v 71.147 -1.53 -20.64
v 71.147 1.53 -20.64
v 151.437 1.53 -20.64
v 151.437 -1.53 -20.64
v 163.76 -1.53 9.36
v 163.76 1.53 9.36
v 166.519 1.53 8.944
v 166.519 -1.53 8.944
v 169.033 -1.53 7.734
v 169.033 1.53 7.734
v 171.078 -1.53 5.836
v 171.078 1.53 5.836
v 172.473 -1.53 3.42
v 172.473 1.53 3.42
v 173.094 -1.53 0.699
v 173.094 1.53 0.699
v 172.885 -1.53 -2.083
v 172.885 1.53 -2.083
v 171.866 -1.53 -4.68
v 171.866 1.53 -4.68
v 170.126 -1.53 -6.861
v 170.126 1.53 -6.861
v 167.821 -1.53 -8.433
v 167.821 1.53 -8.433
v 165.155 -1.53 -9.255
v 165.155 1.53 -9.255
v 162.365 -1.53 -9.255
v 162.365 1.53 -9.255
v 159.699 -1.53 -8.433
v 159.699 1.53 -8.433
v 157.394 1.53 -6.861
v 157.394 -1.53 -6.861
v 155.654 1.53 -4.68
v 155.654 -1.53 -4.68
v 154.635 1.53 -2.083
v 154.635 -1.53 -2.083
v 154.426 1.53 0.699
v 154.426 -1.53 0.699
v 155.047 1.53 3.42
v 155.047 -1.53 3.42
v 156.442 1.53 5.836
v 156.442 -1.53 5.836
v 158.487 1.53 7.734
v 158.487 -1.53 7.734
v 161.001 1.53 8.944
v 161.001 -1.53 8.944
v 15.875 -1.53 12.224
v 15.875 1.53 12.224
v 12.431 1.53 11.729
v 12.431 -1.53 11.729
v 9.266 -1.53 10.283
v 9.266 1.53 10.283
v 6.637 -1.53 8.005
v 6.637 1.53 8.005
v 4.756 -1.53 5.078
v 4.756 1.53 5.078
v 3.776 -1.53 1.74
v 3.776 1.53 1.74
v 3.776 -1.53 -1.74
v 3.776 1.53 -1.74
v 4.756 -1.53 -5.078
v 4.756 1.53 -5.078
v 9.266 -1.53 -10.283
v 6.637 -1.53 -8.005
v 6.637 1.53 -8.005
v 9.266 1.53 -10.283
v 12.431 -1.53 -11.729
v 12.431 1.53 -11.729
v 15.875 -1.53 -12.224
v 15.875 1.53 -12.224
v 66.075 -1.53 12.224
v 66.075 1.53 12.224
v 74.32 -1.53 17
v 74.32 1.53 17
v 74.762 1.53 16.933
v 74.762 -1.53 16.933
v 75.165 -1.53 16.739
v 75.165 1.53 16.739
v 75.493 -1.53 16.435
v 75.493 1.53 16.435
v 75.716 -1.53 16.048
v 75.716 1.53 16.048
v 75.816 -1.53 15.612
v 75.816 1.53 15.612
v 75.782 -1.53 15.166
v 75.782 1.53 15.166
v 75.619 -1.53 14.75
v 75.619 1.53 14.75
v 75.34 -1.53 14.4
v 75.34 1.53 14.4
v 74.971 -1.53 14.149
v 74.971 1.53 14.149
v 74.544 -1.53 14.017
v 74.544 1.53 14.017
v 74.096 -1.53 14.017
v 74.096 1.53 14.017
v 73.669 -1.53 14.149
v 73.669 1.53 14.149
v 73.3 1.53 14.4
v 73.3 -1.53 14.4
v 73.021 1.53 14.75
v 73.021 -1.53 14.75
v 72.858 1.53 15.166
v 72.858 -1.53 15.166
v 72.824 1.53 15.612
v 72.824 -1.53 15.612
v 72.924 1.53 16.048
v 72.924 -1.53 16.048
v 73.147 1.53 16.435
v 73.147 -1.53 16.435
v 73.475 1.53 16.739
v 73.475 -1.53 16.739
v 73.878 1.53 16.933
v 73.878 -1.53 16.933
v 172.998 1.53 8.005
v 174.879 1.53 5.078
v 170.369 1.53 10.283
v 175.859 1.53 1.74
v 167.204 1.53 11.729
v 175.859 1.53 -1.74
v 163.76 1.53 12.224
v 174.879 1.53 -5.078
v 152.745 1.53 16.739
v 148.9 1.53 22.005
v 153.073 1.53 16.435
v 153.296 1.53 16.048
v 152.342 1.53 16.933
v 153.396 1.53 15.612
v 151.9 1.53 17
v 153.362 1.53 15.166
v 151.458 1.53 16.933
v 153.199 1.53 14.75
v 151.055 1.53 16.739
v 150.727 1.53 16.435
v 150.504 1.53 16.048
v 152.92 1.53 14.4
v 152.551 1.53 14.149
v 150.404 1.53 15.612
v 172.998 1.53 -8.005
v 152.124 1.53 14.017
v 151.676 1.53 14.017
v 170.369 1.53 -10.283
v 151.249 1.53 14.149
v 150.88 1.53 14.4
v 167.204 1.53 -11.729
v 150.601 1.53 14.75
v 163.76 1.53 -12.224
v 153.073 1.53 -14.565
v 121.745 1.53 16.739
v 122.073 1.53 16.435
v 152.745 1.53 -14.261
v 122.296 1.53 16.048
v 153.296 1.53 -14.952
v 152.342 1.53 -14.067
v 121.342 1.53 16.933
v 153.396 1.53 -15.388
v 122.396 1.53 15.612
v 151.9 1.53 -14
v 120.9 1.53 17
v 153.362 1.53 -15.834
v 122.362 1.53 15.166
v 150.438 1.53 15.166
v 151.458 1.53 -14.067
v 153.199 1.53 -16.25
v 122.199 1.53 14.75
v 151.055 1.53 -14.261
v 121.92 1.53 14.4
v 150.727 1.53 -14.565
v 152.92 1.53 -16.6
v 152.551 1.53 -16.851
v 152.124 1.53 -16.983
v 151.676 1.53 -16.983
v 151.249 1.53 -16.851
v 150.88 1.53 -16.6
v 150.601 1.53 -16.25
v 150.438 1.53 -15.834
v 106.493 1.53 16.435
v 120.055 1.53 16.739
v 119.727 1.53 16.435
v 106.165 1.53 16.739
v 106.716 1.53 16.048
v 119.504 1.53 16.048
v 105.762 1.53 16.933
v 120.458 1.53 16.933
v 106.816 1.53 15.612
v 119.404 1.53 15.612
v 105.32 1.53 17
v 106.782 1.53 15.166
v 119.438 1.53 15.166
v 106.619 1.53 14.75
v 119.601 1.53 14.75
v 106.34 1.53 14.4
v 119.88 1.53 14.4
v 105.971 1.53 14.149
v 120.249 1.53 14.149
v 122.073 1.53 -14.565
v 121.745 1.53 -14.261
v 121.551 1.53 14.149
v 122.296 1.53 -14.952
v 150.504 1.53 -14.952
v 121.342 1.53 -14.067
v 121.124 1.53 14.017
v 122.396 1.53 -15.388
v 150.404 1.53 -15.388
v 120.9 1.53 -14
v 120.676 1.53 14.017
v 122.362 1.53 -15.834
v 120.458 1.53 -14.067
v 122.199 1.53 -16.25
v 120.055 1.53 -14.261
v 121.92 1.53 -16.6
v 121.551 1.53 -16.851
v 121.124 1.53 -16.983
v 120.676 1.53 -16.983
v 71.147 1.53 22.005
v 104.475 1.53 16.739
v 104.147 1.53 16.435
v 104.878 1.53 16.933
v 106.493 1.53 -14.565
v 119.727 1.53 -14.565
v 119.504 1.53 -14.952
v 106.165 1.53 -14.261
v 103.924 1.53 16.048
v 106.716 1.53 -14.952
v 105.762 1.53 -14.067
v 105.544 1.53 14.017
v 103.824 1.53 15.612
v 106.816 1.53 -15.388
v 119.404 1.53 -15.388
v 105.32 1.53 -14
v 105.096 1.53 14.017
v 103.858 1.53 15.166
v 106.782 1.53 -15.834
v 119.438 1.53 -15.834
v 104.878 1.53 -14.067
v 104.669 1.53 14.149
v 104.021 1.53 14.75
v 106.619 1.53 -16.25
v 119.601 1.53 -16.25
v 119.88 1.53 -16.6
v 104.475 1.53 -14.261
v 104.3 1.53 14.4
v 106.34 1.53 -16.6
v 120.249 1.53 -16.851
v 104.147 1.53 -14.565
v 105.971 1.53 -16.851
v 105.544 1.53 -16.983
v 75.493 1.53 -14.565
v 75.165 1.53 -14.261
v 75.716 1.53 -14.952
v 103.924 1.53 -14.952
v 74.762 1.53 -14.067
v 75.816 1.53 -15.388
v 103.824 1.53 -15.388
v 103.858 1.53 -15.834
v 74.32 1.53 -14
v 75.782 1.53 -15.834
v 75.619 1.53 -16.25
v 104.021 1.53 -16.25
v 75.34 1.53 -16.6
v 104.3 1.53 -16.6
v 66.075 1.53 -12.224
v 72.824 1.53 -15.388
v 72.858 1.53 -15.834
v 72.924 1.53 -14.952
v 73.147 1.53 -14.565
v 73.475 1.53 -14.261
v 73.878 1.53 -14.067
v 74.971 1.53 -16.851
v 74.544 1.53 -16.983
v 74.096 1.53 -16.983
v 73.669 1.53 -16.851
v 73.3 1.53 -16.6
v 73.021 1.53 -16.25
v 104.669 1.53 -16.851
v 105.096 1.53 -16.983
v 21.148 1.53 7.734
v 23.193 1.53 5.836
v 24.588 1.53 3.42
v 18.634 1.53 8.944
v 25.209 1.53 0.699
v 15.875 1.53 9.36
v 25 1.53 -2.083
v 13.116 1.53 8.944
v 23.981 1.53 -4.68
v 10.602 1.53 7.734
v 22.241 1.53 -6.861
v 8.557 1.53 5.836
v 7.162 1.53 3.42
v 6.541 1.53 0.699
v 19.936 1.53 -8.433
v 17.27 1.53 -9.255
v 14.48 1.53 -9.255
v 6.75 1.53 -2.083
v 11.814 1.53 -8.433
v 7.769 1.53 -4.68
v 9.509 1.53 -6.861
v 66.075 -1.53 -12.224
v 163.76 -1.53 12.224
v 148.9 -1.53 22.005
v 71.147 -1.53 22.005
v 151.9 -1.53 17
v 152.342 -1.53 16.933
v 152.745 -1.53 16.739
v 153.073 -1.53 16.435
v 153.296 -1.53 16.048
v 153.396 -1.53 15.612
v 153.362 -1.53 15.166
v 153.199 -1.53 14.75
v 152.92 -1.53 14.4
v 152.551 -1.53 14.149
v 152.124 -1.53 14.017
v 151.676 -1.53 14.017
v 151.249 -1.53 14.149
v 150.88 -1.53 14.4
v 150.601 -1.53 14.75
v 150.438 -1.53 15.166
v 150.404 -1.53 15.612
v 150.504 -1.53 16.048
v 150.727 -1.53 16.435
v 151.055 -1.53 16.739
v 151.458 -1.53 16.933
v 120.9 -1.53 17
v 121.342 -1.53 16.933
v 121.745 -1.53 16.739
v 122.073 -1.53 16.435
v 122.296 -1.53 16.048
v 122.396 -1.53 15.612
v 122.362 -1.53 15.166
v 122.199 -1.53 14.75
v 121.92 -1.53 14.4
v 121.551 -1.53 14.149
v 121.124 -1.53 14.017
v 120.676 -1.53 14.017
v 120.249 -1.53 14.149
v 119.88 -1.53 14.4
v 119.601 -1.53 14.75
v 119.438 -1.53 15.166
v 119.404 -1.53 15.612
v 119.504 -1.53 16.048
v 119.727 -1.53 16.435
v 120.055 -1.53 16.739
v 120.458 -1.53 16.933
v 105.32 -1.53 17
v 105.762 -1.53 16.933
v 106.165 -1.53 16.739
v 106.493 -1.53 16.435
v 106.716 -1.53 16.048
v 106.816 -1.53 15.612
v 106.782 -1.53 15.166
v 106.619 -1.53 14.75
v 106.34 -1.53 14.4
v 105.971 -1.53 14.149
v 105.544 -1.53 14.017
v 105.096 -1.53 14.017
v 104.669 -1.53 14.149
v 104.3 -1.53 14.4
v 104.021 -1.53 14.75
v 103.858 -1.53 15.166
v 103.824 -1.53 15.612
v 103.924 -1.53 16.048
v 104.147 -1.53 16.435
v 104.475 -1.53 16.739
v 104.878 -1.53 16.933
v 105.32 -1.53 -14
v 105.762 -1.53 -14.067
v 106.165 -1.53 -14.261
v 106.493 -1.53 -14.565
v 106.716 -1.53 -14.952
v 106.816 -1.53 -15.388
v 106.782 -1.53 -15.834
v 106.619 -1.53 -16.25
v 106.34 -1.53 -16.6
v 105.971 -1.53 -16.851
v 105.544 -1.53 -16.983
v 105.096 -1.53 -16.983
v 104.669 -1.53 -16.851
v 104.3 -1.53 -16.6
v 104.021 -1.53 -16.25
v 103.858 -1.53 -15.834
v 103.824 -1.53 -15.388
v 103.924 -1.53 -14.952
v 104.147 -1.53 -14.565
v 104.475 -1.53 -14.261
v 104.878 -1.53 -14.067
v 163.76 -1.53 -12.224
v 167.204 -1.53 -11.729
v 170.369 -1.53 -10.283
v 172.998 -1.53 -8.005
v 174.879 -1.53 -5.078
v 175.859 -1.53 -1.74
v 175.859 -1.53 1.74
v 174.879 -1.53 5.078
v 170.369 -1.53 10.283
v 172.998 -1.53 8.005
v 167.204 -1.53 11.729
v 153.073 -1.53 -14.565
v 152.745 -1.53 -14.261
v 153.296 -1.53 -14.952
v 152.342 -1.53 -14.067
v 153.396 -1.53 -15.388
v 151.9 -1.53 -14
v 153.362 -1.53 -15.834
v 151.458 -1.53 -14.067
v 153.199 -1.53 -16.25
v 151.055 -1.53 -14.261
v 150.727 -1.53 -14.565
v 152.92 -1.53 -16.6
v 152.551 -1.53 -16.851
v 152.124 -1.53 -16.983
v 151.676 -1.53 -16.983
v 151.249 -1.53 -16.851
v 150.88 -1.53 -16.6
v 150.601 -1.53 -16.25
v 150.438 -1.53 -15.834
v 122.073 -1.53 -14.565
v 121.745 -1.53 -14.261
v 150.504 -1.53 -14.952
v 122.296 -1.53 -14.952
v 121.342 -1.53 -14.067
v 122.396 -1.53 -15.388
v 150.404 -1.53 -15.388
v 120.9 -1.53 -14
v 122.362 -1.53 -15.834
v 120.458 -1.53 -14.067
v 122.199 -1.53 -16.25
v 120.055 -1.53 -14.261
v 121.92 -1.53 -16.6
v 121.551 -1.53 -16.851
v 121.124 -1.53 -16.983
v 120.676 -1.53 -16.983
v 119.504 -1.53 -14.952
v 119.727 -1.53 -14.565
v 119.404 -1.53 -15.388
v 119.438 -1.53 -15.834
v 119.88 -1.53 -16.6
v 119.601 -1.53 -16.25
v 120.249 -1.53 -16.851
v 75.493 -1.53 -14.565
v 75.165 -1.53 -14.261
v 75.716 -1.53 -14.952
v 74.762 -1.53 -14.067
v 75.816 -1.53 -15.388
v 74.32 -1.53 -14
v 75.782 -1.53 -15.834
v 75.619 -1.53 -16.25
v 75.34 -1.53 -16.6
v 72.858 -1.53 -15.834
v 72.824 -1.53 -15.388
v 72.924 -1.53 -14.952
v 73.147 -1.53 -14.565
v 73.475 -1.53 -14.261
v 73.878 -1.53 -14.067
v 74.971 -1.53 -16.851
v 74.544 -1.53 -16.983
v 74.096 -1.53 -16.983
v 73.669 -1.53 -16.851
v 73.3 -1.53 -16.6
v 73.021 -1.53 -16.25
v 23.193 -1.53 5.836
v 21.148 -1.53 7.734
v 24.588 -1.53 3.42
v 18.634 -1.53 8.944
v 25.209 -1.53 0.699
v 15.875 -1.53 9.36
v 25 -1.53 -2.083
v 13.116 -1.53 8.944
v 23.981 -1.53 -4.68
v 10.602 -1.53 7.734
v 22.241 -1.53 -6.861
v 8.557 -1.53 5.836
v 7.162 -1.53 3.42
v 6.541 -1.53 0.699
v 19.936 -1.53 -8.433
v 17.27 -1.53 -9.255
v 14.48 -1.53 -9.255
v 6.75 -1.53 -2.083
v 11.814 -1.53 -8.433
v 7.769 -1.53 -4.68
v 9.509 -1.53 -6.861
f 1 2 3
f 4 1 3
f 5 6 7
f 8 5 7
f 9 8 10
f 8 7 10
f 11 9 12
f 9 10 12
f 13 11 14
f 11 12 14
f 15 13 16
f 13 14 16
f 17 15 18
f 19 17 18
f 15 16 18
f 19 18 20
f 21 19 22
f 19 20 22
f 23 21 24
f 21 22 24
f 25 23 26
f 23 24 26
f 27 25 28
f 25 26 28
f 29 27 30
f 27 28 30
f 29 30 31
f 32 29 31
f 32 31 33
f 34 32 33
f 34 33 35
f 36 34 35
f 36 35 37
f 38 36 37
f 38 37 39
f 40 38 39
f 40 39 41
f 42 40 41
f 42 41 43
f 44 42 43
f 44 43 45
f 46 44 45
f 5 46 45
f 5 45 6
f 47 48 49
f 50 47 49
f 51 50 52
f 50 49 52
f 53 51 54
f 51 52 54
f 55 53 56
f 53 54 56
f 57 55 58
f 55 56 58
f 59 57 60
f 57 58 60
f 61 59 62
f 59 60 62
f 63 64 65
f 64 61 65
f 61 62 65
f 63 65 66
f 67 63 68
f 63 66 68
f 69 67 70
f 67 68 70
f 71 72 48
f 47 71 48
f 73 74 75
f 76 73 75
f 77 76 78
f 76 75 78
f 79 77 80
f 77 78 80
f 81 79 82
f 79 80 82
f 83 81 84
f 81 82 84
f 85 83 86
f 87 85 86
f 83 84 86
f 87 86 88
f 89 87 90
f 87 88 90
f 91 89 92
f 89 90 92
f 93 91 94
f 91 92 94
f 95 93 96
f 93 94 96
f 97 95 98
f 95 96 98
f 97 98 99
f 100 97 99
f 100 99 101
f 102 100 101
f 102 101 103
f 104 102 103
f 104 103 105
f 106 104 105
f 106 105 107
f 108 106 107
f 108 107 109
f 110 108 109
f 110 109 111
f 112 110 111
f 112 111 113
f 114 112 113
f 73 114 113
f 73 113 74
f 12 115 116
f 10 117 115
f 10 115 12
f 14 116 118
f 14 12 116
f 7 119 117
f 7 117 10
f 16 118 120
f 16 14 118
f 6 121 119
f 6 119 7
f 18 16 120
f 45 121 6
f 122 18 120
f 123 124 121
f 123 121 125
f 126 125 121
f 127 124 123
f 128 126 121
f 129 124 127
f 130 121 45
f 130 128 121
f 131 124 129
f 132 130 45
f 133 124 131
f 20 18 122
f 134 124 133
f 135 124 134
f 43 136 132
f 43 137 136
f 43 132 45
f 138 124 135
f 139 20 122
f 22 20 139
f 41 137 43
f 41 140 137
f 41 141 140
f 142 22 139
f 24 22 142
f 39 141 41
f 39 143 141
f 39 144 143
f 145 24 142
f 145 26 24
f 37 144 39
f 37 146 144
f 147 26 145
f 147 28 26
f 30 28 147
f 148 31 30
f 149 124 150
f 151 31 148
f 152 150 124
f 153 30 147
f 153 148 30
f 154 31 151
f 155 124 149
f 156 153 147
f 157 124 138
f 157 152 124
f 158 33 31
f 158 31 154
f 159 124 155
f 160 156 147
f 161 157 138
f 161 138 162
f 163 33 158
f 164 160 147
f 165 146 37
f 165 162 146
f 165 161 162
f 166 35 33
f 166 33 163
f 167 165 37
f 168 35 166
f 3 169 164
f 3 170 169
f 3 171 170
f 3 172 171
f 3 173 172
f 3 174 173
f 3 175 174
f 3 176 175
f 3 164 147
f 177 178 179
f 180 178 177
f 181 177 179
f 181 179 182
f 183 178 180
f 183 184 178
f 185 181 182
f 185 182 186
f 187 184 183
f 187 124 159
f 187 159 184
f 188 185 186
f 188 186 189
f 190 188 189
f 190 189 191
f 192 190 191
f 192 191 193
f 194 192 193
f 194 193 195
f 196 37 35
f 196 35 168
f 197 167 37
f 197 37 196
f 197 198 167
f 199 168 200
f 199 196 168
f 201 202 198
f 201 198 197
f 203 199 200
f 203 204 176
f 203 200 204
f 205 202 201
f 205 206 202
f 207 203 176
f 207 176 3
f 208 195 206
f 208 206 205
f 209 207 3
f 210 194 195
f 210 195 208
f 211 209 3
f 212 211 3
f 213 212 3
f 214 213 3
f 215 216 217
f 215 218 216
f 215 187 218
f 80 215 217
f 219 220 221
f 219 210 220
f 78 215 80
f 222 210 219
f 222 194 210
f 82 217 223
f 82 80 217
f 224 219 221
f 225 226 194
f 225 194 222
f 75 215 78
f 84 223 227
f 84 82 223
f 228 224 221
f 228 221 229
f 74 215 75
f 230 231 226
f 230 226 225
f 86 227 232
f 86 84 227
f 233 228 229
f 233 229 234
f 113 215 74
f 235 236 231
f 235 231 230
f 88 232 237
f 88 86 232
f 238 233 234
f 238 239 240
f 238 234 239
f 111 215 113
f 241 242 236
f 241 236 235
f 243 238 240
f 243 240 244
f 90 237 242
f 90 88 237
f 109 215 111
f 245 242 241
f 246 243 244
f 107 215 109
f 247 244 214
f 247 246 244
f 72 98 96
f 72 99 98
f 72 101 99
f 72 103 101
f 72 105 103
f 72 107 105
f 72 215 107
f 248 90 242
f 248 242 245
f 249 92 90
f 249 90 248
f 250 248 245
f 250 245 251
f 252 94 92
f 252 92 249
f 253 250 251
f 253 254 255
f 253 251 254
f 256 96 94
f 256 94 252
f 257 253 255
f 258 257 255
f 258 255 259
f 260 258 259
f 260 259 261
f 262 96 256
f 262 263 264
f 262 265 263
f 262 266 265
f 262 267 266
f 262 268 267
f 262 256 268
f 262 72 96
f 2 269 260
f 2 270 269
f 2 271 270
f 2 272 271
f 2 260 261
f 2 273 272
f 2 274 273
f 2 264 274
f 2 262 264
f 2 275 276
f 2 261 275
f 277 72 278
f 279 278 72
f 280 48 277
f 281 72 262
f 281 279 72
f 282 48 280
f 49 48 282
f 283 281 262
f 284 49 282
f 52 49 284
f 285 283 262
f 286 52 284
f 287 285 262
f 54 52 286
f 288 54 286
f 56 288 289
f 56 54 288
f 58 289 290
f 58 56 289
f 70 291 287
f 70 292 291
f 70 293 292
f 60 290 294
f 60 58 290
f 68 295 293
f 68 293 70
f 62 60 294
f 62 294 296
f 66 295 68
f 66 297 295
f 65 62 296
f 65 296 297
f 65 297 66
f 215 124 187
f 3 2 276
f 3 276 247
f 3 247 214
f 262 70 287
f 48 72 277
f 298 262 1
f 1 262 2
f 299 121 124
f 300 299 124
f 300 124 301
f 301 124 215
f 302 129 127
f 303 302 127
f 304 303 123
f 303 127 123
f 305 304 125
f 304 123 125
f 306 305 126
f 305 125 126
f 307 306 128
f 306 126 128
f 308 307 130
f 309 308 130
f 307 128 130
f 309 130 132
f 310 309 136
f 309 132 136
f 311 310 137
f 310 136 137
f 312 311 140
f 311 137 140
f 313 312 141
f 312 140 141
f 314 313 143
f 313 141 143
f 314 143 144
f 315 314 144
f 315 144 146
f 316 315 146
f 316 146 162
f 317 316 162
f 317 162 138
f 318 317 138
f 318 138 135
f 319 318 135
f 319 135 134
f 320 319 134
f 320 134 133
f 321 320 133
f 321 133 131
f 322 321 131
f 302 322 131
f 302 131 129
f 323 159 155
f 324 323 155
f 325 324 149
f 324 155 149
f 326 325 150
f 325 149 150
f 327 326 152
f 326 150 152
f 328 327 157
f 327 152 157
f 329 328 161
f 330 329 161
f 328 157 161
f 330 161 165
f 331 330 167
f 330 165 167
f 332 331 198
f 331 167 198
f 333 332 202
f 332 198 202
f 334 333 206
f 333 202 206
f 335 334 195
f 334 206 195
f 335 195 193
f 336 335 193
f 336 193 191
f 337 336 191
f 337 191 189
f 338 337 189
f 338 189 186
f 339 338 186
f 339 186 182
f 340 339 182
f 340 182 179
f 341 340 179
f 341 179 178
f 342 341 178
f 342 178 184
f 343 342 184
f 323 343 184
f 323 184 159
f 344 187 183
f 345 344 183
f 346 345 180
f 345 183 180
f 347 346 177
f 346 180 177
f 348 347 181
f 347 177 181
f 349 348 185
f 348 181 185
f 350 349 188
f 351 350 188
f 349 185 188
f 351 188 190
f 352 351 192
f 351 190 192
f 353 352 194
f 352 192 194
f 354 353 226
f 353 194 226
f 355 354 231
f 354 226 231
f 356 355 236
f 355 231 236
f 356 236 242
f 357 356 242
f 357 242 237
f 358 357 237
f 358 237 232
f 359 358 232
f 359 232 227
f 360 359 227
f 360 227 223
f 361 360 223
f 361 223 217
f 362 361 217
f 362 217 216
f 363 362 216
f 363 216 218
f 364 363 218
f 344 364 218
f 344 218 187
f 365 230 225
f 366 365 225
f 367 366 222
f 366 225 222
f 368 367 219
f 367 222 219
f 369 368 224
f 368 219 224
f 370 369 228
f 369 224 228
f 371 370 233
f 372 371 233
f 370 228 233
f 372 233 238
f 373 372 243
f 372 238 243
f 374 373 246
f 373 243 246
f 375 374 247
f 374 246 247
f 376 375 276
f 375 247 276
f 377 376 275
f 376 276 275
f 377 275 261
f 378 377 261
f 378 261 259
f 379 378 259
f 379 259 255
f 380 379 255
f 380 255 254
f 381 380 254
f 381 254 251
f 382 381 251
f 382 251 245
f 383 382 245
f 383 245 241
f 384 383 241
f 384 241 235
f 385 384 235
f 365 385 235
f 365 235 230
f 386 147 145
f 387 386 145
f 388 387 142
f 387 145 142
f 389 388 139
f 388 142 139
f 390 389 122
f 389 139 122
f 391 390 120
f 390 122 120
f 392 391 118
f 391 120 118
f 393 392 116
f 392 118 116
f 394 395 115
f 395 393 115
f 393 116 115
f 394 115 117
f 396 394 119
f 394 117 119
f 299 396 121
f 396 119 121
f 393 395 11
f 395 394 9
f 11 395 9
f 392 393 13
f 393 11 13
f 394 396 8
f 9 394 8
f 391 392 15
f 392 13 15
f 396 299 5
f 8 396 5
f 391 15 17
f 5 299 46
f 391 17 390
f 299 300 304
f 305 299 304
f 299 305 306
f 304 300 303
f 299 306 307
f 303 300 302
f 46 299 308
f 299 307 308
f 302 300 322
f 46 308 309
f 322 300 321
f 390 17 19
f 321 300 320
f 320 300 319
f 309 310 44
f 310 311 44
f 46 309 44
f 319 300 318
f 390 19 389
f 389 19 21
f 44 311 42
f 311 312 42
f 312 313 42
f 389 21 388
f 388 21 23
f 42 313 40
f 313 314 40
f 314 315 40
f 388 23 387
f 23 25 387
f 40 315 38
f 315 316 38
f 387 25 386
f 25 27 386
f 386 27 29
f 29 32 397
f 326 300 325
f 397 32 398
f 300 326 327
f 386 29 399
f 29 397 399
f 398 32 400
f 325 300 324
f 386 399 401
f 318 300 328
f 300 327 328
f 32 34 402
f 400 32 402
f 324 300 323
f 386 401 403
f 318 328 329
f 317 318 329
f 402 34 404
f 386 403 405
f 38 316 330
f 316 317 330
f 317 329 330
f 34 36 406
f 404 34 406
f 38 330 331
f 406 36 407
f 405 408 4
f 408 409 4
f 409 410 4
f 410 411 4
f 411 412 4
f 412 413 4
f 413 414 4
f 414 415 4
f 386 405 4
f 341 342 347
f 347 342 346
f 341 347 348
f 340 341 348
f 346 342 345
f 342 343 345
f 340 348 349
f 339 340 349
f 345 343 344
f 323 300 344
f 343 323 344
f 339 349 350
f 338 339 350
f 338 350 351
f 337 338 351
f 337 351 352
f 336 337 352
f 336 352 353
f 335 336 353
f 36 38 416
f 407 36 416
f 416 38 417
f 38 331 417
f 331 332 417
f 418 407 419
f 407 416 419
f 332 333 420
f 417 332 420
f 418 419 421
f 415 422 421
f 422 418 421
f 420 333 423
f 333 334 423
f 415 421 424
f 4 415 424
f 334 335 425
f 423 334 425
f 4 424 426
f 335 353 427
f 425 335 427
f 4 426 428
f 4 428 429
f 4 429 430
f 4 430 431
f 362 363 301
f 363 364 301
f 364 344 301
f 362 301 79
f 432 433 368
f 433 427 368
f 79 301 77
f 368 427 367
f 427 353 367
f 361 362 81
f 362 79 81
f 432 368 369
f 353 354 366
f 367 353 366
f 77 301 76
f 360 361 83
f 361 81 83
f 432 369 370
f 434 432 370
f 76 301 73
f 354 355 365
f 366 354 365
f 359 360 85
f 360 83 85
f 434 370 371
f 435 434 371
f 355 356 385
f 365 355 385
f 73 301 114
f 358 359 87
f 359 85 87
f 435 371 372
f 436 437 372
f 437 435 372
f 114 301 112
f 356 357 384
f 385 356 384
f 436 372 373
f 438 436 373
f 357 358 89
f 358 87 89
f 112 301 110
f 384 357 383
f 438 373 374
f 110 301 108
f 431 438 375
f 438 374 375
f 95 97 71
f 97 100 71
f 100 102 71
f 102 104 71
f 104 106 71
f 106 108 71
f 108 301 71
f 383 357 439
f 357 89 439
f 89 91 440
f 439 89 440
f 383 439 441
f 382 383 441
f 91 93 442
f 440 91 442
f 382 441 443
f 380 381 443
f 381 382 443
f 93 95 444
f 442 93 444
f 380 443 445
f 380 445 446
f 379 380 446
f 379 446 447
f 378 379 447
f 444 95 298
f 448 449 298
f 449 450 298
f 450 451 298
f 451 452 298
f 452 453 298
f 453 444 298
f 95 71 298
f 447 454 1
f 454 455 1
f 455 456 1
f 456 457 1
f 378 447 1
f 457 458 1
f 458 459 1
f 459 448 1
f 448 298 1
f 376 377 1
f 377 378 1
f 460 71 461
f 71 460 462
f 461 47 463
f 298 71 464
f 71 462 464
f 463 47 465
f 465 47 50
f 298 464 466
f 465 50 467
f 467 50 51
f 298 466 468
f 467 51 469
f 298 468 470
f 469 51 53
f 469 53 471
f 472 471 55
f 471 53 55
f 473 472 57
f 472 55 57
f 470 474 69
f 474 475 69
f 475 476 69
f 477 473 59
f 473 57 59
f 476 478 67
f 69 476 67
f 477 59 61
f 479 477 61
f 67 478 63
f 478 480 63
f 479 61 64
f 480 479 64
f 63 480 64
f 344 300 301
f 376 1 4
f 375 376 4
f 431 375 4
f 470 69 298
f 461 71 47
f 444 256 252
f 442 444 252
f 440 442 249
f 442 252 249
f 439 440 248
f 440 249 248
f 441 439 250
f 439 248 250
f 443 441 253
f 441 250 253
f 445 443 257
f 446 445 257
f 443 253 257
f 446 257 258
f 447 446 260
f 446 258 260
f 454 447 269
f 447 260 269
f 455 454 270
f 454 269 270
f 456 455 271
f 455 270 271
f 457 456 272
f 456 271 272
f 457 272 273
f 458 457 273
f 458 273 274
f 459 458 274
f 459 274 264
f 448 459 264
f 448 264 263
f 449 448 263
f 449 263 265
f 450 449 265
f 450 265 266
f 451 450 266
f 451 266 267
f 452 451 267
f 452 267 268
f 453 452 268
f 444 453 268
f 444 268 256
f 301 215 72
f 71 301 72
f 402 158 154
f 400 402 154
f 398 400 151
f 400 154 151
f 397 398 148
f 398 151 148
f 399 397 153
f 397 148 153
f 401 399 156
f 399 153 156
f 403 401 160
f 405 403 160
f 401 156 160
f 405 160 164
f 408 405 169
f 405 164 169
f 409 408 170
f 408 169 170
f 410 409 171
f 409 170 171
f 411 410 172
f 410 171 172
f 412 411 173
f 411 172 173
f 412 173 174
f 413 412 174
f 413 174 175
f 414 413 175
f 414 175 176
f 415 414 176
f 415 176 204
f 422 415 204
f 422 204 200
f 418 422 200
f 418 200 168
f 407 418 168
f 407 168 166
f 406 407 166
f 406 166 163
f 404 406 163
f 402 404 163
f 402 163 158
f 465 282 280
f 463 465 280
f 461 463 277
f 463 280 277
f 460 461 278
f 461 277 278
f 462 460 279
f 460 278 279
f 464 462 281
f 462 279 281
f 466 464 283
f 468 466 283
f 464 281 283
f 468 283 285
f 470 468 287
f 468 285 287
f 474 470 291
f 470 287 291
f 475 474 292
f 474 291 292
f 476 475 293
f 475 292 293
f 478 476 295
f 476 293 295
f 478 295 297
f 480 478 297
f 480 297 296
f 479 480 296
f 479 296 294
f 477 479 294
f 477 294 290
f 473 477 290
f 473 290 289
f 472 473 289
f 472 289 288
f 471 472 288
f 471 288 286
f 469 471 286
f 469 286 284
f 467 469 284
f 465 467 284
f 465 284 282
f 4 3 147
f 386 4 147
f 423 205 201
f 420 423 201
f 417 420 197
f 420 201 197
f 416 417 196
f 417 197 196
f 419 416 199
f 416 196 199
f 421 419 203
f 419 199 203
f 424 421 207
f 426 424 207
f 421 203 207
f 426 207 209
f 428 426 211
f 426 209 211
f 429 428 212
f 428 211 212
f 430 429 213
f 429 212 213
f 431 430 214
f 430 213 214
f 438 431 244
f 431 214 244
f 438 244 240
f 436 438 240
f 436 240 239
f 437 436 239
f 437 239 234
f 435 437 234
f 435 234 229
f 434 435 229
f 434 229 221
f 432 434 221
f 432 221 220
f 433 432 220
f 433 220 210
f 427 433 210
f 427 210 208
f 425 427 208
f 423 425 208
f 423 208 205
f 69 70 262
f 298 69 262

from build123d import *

# Parameters (mm, degrees)
SKETCH5_W          = 50.68
SKETCH5_H          = 3.06
EXTRUDE2_DEPTH     = 180
SKETCH6_R          = 9.36
SKETCH6_R_2        = 1.5
CUT_EXTRUDE3_DEPTH = 182.800657865
SKETCH7_W          = 77.752773683
SKETCH7_H          = 3.335005788
CUT_EXTRUDE4_DEPTH = 178.825100476


with BuildPart() as part:
    # Sketch5 → Extrude2 (new body)
    with BuildSketch(Plane(origin=(0, 0, 0), x_dir=(0, 0, -1), z_dir=(1, 0, 0))):
        Rectangle(SKETCH5_W, SKETCH5_H)
    extrude(amount=EXTRUDE2_DEPTH)

    # Sketch6 → Cut-Extrude3 (cut, through all)
    with BuildSketch(Plane(origin=(0, 1.53, 0), x_dir=(-1, 0, 0), z_dir=(0, 1, 0))):
        with Locations(Location((-15.875, 0, 0), (0, 0, 90))):
            Circle(SKETCH6_R)
        with Locations(Location((-74.32, -15.5, 0), (0, 0, 90))):
            Circle(SKETCH6_R_2)
        with Locations(Location((-74.32, 15.5, 0), (0, 0, 90))):
            Circle(SKETCH6_R_2)
        with Locations(Location((-105.32, -15.5, 0), (0, 0, 90))):
            Circle(SKETCH6_R_2)
        with Locations(Location((-105.32, 15.5, 0), (0, 0, 90))):
            Circle(SKETCH6_R_2)
        with Locations(Location((-120.9, -15.5, 0), (0, 0, 90))):
            Circle(SKETCH6_R_2)
        with Locations(Location((-120.9, 15.5, 0), (0, 0, 90))):
            Circle(SKETCH6_R_2)
        with Locations(Location((-151.9, -15.5, 0), (0, 0, 90))):
            Circle(SKETCH6_R_2)
        with Locations(Location((-151.9, 15.5, 0), (0, 0, 90))):
            Circle(SKETCH6_R_2)
        with Locations(Location((-163.76, 0, 0), (0, 0, 90))):
            Circle(SKETCH6_R)
        with BuildLine():
            Line((-163.76, 12.223769591), (-148.9, 22.004994212))
            Line((-148.9, 22.004994212), (-148.9, 25.34))
            Line((-148.9, 25.34), (-180, 25.34))
            Line((-180, 25.34), (-180, -25.34))
            Line((-180, -25.34), (0, -25.34))
            Line((0, -25.34), (0, 25.34))
            Line((0, 25.34), (-71.147226317, 25.34))
            Line((-71.147226317, 25.34), (-71.147226317, 22.004994212))
            Line((-71.147226317, 22.004994212), (-66.075480217, 12.223769591))
            Line((-66.075480217, 12.223769591), (-15.875, 12.223769591))
            ThreePointArc((-15.875, 12.223769591), (-3.651230409, 0), (-15.875, -12.223769591))
            Line((-15.875, -12.223769591), (-66.075480217, -12.223769591))
            Line((-66.075480217, -12.223769591), (-71.147226317, -20.64))
            Line((-71.147226317, -20.64), (-151.43711062, -20.64))
            Line((-151.43711062, -20.64), (-163.76, -12.223769591))
            ThreePointArc((-163.76, -12.223769591), (-175.983769591, 0), (-163.76, 12.223769591))
        make_face()
    extrude(amount=-CUT_EXTRUDE3_DEPTH, mode=Mode.SUBTRACT)

    # Sketch7 → Cut-Extrude4 (cut, through all)
    with BuildSketch(Plane(origin=(0, 1.53, 0), x_dir=(-1, 0, 0), z_dir=(0, 1, 0))):
        with Locations((-110.023613159, 23.672497106)):
            Rectangle(SKETCH7_W, SKETCH7_H)
    extrude(amount=-CUT_EXTRUDE4_DEPTH, mode=Mode.SUBTRACT)


solid = part.part
